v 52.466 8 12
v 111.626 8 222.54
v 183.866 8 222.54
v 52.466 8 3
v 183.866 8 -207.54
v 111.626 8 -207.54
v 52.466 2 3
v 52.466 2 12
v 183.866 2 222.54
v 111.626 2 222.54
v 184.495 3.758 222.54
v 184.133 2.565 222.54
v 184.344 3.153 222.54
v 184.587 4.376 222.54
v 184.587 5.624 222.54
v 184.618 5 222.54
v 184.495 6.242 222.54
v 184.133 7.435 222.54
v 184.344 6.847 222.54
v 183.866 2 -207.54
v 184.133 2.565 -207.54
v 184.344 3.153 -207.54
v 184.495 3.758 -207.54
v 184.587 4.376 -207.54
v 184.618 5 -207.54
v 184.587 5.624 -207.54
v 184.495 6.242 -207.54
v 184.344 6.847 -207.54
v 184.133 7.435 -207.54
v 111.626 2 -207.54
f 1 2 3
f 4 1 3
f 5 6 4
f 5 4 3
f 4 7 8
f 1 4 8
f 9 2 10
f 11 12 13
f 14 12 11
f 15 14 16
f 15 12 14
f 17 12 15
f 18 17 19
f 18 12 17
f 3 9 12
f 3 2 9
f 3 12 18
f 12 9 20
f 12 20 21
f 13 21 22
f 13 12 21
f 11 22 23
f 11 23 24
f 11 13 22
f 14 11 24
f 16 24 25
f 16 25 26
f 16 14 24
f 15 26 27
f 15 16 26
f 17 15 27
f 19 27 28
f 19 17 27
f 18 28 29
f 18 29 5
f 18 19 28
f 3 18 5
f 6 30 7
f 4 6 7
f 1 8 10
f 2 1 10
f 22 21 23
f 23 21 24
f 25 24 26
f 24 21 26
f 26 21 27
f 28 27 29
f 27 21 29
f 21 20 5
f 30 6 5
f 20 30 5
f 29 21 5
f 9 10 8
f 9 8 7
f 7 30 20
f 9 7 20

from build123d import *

# Parameters (mm, degrees)
BOSS_EXTRUDE1_DEPTH = 10
SCALE2_SCALE        = 0.6
BOSS_EXTRUDE2_DEPTH = 430.08


with BuildPart() as part:
    # Sketch1 → Boss-Extrude1 (new body)
    with BuildSketch(Plane(origin=(0, 0, 0), x_dir=(1, 0, 0), z_dir=(0, 1, 0))):
        Polygon((219, 0), (219, 350.9), (98.6, 350.9), (0, 0), (0, -15), (98.6, -365.9), (219, -365.9), (219, -15), align=None)
    extrude(amount=BOSS_EXTRUDE1_DEPTH)


with BuildPart() as part_1:
    # Scale2: scaled about (131.165360429, 5, 7.5)
    add(part.part.scale(SCALE2_SCALE).moved(Location((52.466144172, 2, 3))))

    # Sketch2 → Boss-Extrude2 (add)
    with BuildSketch(Plane.XY.offset(222.54)):
        with BuildLine():
            Line((183.866144171, 8), (183.866144171, 2))
            ThreePointArc((183.866144171, 2), (184.617619122, 5), (183.866144171, 8))
        make_face()
    extrude(amount=-BOSS_EXTRUDE2_DEPTH)


solid = part_1.part
